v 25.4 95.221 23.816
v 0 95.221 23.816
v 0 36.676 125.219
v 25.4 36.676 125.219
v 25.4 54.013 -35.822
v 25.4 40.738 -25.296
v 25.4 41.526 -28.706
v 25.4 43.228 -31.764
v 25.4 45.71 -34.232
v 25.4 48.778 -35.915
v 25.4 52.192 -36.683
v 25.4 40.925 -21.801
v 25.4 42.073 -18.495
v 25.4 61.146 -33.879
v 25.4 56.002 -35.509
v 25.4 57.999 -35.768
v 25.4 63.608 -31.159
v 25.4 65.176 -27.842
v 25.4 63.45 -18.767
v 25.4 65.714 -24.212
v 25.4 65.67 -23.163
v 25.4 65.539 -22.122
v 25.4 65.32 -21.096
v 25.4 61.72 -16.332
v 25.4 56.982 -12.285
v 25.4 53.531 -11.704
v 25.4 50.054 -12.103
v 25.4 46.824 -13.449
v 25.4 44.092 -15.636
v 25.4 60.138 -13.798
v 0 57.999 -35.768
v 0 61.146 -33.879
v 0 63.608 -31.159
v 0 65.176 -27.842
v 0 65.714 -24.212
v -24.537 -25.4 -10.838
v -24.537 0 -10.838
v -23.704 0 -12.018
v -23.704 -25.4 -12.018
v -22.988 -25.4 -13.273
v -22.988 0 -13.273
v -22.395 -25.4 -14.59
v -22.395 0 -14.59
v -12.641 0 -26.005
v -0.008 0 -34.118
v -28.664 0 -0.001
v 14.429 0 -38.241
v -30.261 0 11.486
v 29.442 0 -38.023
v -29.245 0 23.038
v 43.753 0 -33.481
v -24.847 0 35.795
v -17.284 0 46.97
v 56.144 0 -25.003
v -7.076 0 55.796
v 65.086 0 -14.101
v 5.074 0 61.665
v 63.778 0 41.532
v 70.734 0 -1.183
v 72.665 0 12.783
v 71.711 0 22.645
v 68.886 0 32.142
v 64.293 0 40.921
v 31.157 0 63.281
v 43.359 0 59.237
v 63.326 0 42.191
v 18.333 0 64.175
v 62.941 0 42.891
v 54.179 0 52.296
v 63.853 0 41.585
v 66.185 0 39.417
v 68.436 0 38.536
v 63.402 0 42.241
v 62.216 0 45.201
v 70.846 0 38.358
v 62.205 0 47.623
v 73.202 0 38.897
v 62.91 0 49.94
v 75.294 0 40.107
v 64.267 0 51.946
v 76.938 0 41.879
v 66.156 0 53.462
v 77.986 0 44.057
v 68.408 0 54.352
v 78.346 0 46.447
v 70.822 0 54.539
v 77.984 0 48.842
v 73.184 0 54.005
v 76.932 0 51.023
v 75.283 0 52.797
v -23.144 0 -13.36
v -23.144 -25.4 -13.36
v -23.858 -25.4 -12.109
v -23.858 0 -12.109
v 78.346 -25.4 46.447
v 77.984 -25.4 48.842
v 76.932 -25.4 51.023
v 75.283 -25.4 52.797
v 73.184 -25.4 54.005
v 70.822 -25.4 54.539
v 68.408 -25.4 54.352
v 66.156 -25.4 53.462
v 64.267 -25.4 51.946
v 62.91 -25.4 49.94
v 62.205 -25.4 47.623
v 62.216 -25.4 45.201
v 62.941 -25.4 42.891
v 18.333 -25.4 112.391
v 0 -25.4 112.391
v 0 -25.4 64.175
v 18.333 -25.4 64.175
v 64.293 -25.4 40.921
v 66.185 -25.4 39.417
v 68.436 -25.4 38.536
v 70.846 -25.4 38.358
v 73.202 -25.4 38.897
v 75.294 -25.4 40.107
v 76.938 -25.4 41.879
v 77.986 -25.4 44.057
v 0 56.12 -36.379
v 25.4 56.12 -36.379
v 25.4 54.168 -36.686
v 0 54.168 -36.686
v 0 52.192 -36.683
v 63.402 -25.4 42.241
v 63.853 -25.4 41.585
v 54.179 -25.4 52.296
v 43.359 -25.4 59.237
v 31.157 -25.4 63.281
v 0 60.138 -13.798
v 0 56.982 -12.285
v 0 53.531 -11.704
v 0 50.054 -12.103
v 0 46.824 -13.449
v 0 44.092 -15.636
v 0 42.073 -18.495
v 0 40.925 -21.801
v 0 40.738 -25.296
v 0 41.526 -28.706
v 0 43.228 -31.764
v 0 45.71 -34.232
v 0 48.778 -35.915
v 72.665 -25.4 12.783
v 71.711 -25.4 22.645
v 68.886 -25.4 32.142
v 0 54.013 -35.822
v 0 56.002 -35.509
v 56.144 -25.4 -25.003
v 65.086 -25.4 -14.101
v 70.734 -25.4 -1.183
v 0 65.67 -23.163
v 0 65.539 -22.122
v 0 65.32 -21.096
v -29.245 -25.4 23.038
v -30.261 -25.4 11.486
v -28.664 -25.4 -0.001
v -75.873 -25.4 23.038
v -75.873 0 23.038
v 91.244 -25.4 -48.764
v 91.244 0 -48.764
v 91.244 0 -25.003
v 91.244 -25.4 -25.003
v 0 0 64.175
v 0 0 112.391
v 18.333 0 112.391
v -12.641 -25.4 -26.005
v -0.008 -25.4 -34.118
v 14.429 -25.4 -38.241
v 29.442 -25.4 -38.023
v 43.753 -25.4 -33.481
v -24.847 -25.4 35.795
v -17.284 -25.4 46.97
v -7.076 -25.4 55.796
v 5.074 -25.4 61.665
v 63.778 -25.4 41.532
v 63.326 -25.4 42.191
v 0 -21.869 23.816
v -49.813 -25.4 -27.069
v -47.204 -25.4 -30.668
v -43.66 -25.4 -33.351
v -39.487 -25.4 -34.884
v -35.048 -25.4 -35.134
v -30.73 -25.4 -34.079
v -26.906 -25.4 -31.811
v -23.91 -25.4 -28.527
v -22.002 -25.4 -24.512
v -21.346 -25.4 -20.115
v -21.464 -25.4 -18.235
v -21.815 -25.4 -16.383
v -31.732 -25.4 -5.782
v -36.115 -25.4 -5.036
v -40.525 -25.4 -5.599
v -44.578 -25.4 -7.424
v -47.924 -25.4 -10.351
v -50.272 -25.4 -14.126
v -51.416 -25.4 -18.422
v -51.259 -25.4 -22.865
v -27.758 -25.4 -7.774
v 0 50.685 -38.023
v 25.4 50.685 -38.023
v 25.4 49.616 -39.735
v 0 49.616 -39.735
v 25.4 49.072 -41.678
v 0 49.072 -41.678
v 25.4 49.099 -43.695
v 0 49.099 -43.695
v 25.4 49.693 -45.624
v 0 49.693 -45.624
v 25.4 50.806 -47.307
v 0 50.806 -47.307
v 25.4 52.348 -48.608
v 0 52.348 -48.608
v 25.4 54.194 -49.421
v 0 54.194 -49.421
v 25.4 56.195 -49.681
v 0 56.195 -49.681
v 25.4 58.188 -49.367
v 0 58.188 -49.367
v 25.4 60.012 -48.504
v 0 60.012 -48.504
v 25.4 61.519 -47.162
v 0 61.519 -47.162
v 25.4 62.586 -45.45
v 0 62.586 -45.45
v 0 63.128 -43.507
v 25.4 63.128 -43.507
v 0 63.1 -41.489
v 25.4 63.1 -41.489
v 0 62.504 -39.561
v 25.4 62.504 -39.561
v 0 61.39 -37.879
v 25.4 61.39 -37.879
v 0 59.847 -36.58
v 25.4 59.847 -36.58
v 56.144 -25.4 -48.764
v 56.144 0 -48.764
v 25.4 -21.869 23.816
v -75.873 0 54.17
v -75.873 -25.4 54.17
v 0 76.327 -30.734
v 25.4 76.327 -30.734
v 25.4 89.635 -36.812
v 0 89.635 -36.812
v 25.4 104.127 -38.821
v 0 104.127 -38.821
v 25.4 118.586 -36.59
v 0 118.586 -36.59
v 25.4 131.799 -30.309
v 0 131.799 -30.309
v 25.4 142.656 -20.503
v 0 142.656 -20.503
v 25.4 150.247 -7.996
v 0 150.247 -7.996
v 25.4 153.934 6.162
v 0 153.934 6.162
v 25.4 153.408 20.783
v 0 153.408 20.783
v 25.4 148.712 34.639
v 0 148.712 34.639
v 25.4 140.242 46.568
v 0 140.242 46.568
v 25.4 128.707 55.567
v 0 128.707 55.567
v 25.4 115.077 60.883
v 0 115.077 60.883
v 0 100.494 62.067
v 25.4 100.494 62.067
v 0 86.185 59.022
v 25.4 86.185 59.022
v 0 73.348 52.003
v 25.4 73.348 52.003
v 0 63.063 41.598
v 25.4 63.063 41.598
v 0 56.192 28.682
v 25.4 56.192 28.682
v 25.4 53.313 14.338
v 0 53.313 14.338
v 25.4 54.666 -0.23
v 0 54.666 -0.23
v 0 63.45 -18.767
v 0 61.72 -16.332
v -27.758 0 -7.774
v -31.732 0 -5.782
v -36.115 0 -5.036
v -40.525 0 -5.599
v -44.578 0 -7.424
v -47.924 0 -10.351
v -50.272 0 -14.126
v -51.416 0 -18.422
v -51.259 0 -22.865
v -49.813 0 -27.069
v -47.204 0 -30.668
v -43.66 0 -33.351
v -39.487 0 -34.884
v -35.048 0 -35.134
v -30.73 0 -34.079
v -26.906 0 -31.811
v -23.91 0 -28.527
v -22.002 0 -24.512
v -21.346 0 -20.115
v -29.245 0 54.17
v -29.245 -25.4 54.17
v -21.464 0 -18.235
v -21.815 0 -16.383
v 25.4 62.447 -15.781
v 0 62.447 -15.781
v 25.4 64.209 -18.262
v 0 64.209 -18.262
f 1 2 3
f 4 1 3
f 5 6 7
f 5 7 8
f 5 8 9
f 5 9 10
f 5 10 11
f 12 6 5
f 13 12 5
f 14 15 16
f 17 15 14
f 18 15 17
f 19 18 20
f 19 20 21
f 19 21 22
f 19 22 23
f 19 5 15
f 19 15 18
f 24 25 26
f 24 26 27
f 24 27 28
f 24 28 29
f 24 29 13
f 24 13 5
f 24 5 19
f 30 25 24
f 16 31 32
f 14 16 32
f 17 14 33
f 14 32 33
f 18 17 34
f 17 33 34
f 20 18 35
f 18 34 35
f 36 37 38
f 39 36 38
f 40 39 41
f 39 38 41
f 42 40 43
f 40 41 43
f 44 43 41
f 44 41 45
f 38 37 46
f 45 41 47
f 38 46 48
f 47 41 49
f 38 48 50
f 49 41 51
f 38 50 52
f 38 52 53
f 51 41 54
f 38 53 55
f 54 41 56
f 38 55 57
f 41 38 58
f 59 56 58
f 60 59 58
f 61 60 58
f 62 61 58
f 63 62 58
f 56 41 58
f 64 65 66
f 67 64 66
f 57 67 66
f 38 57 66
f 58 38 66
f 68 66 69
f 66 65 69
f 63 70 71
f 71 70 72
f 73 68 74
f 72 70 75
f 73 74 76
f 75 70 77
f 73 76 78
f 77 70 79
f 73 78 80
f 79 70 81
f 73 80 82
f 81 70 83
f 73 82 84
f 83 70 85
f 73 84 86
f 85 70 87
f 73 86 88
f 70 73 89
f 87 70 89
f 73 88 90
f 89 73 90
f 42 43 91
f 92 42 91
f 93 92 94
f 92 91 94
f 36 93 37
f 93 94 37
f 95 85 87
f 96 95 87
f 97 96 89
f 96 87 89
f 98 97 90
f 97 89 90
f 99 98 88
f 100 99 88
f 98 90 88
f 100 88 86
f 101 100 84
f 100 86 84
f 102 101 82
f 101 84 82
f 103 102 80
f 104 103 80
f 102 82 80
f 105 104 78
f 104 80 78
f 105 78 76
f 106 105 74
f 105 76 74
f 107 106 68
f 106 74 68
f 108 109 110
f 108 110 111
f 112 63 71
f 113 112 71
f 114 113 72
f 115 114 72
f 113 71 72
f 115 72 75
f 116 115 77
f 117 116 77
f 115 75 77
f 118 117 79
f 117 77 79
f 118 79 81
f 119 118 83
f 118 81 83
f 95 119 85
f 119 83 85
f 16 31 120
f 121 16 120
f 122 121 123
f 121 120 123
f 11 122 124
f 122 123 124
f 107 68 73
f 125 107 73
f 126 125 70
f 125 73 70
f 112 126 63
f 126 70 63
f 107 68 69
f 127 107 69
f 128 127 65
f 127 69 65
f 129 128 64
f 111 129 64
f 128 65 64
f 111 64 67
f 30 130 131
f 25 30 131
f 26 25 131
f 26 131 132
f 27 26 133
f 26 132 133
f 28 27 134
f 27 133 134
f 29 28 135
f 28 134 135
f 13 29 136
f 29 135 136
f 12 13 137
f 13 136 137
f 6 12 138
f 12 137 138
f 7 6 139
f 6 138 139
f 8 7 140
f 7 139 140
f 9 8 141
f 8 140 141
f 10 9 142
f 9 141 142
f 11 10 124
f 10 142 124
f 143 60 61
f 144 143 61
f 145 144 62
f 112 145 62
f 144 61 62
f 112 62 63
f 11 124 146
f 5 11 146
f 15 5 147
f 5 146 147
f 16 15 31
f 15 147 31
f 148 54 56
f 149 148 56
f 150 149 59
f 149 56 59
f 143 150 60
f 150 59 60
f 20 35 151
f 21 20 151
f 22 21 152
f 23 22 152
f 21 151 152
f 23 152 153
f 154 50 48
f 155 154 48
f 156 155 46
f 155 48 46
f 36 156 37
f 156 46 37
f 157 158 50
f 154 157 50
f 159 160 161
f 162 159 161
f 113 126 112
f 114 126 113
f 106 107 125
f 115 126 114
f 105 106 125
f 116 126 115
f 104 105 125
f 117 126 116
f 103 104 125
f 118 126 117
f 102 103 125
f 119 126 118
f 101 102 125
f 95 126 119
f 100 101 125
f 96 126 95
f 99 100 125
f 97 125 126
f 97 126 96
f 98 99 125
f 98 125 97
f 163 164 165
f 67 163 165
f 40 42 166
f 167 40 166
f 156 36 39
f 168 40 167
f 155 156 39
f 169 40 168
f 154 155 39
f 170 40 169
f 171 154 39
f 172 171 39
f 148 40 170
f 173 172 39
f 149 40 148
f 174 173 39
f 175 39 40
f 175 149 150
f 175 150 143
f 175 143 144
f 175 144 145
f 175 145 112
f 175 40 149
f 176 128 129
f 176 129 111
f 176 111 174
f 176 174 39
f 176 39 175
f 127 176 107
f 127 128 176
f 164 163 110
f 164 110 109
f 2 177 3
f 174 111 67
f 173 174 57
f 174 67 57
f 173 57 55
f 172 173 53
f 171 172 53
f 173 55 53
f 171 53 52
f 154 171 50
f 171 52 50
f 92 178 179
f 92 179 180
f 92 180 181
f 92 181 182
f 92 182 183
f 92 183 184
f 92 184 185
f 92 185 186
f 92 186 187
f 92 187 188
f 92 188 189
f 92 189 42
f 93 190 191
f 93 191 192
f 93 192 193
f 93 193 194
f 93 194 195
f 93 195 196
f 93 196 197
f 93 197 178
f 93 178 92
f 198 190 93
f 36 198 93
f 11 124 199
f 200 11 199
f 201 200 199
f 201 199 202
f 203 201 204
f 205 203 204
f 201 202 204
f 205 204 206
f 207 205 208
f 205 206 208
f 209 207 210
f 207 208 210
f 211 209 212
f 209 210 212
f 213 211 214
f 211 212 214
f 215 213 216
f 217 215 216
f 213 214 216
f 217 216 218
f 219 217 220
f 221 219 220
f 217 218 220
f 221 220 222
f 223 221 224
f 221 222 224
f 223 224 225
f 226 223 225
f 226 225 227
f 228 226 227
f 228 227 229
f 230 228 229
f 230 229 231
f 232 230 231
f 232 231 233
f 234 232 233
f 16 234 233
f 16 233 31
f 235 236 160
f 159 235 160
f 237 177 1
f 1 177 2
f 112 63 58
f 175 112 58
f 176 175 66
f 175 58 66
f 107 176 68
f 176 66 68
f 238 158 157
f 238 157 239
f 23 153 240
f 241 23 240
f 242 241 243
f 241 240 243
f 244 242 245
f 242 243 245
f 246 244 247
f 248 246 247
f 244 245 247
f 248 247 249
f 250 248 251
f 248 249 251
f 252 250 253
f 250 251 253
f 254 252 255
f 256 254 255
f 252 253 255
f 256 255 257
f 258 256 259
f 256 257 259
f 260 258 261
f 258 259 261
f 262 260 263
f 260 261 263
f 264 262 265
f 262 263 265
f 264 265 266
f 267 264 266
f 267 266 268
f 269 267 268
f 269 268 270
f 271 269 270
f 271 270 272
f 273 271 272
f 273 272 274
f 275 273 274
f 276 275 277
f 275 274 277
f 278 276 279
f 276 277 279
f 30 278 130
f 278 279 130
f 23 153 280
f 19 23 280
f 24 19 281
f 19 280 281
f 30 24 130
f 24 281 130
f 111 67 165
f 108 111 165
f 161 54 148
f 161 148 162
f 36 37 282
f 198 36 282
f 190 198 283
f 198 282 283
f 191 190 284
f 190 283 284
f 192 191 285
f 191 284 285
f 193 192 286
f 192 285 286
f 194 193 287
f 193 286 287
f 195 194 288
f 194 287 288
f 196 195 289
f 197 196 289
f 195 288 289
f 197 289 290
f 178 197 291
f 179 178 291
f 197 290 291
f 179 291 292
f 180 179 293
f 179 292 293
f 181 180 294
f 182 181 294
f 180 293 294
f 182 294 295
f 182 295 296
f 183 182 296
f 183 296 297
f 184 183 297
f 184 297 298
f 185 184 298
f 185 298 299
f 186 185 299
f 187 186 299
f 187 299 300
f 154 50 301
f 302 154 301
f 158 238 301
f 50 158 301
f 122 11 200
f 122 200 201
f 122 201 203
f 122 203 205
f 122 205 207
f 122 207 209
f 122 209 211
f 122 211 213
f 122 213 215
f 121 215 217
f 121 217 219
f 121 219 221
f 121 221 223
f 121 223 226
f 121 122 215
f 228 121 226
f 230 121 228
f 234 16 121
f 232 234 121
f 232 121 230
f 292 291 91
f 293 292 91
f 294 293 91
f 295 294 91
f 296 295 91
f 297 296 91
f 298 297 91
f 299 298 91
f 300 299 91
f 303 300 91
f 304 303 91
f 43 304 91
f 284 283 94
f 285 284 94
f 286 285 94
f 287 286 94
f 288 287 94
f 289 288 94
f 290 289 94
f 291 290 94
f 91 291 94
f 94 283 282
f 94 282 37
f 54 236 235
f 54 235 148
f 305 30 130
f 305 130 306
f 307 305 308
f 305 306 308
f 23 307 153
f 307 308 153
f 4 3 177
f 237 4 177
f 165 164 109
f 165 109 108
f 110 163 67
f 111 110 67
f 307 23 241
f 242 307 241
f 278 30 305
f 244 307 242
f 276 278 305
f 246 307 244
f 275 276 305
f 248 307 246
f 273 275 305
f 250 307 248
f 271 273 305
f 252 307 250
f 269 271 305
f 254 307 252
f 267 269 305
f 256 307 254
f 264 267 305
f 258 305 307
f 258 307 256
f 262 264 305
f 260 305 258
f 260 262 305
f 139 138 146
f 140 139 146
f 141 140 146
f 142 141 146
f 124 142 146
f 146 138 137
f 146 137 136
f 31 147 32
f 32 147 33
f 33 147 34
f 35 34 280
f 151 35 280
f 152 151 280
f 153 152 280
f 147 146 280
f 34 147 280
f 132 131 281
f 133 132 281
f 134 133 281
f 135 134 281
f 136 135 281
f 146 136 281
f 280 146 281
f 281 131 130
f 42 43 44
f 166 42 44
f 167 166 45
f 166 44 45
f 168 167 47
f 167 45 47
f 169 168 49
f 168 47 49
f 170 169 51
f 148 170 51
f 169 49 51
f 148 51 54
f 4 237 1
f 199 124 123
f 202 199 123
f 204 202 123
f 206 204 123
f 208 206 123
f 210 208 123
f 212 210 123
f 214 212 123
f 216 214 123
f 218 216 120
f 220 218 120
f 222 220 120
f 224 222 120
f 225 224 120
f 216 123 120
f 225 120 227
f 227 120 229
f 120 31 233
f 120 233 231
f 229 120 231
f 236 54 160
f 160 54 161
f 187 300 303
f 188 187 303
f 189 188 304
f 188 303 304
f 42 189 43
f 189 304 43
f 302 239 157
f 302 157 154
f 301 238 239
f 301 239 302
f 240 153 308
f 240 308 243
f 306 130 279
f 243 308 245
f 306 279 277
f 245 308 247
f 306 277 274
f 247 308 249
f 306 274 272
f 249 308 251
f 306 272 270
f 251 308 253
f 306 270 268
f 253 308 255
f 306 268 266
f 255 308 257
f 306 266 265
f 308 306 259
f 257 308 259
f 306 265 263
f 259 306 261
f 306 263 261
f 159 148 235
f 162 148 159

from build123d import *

# Parameters (mm, degrees)
F1_DEPTH = 25.4
F0_W     = 35.1004998692
F0_H     = 23.7618147956
F0_W_2   = 46.6273950725
F0_H_2   = 31.1326426156
F0_W_3   = 18.3327432124
F0_H_3   = 48.2166351118
F3_DEPTH = 25.4
F5_DEPTH = 25.4


with BuildPart() as f1:
    # F0 (on Front) → F1 (new body)
    with BuildSketch(Plane.XZ):
        with BuildLine():
            ThreePointArc((62.9410594702, 42.8905300796), (43.3588603902, 59.2374555897), (18.3327432124, 64.1748591027))
            ThreePointArc((18.3327432124, 64.1748591027), (-12.4706462623, 51.7189218261), (-29.2454881281, 23.0378504209))
            ThreePointArc((-29.2454881281, 23.0378504209), (-29.7872435834, 5.6973312725), (-24.536992326, -10.838144682))
            ThreePointArc((-24.536992326, -10.838144682), (-23.3308600115, -12.63708195), (-22.3948247731, -14.5902251825))
            ThreePointArc((-22.3948247731, -14.5902251825), (14.4291746764, -38.2413882223), (56.1438922278, -25.0025518609))
            ThreePointArc((56.1438922278, -25.0025518609), (68.3541696909, -7.8365718308), (72.6649516178, 12.7832949316))
            ThreePointArc((72.6649516178, 12.7832949316), (70.52758963, 27.4617353398), (64.2930134713, 40.9211182829))
            ThreePointArc((64.2930134713, 40.9211182829), (63.5441553551, 41.855793042), (62.9410594702, 42.8905300796))
        make_face()
    extrude(amount=F1_DEPTH)


with BuildPart() as f1b:
    # F0 (on Front) → F1, piece 2 (new body)
    with BuildSketch(Plane.XZ):
        with Locations((73.6941421624, -36.8834592587)):
            Rectangle(F0_W, F0_H)
    extrude(amount=F1_DEPTH)


with BuildPart() as f1c:
    # F0 (on Front) → F1, piece 3 (new body)
    with BuildSketch(Plane.XZ):
        with Locations((-52.5591856644, 38.6041717287)):
            Rectangle(F0_W_2, F0_H_2)
    extrude(amount=F1_DEPTH)


with BuildPart() as f1d:
    # F0 (on Front) → F1, piece 4 (new body)
    with BuildSketch(Plane.XZ):
        with Locations((9.1663716062, 88.2831766586)):
            Rectangle(F0_W_3, F0_H_3)
    extrude(amount=F1_DEPTH)


with BuildPart() as f1e:
    # F0 (on Front) → F1, piece 5 (new body)
    with BuildSketch(Plane.XZ):
        with BuildLine():
            ThreePointArc((78.3458810146, 46.4474136514), (68.4076058859, 54.3524744917), (62.9410594702, 42.8905300796))
            ThreePointArc((62.9410594702, 42.8905300796), (63.6284631724, 41.9136683381), (64.2930134713, 40.9211182829))
            ThreePointArc((64.2930134713, 40.9211182829), (73.2019635024, 38.8971979808), (78.3458810146, 46.4474136514))
        make_face()
    extrude(amount=F1_DEPTH)


with BuildPart() as f1f:
    # F0 (on Front) → F1, piece 6 (new body)
    with BuildSketch(Plane.XZ):
        with BuildLine():
            ThreePointArc((-22.3948247731, -14.5902251825), (-23.5052950028, -12.7366717585), (-24.536992326, -10.838144682))
            ThreePointArc((-24.536992326, -10.838144682), (-50.6915914862, -25.0203341449), (-21.3464574604, -20.1151670529))
            ThreePointArc((-21.3464574604, -20.1151670529), (-21.6108669498, -17.3034035185), (-22.3948247731, -14.5902251825))
        make_face()
    extrude(amount=F1_DEPTH)


with BuildPart() as f3:
    # F2 (on Right) → F3 (new body)
    with BuildSketch(Plane.YZ):
        with BuildLine():
            ThreePointArc((57.9994903279, -35.7675670337), (63.6084778415, -31.1590847227), (65.7144614914, -24.2118778735))
            ThreePointArc((65.7144614914, -24.2118778735), (65.6155180758, -22.6414926107), (65.3202527329, -21.0959447951))
            ThreePointArc((65.3202527329, -21.0959447951), (62.5671179416, -17.5621102816), (60.1380027846, -13.798184525))
            ThreePointArc((60.1380027846, -13.798184525), (41.3832425563, -20.1080546613), (52.192333573, -36.6827052986))
            ThreePointArc((52.192333573, -36.6827052986), (54.9965455414, -35.5945906676), (57.9994903279, -35.7675670337))
        make_face()
    extrude(amount=F3_DEPTH)


with BuildPart() as f3b:
    # F2 (on Right) → F3, piece 2 (new body)
    with BuildSketch(Plane.YZ):
        with BuildLine():
            ThreePointArc((60.1380027846, -13.798184525), (63.4040352976, -16.9678026085), (65.3202527329, -21.0959447951))
            ThreePointArc((65.3202527329, -21.0959447951), (121.2020574053, -35.7065100131), (154.2361799063, 11.6748308294))
            ThreePointArc((154.2361799063, 11.6748308294), (90.5442953395, 60.4173724355), (60.1380027846, -13.798184525))
        make_face()
    extrude(amount=F3_DEPTH)


with BuildPart() as f3c:
    # F2 (on Right) → F3, piece 3 (new body)
    with BuildSketch(Plane.YZ):
        with BuildLine():
            ThreePointArc((63.1867136248, -42.5951600476), (61.7428184579, -38.307873263), (57.9994903279, -35.7675670337))
            ThreePointArc((57.9994903279, -35.7675670337), (55.1504238642, -36.5710502649), (52.192333573, -36.6827052986))
            ThreePointArc((52.192333573, -36.6827052986), (52.7431673209, -48.8368247671), (63.1867136248, -42.5951600476))
        make_face()
    extrude(amount=F3_DEPTH)


with BuildPart() as f5:
    # F4 (on Right) → F5 (new body)
    with BuildSketch(Plane.YZ):
        Polygon((-21.8691436883, 23.8156784326), (95.2208472725, 23.8156784326), (36.6758517921, 125.2185851336), align=None)
    extrude(amount=F5_DEPTH)


solid = Compound([f1.part, f1b.part, f1c.part, f1d.part, f1e.part, f1f.part, f3.part, f3b.part, f3c.part, f5.part])
